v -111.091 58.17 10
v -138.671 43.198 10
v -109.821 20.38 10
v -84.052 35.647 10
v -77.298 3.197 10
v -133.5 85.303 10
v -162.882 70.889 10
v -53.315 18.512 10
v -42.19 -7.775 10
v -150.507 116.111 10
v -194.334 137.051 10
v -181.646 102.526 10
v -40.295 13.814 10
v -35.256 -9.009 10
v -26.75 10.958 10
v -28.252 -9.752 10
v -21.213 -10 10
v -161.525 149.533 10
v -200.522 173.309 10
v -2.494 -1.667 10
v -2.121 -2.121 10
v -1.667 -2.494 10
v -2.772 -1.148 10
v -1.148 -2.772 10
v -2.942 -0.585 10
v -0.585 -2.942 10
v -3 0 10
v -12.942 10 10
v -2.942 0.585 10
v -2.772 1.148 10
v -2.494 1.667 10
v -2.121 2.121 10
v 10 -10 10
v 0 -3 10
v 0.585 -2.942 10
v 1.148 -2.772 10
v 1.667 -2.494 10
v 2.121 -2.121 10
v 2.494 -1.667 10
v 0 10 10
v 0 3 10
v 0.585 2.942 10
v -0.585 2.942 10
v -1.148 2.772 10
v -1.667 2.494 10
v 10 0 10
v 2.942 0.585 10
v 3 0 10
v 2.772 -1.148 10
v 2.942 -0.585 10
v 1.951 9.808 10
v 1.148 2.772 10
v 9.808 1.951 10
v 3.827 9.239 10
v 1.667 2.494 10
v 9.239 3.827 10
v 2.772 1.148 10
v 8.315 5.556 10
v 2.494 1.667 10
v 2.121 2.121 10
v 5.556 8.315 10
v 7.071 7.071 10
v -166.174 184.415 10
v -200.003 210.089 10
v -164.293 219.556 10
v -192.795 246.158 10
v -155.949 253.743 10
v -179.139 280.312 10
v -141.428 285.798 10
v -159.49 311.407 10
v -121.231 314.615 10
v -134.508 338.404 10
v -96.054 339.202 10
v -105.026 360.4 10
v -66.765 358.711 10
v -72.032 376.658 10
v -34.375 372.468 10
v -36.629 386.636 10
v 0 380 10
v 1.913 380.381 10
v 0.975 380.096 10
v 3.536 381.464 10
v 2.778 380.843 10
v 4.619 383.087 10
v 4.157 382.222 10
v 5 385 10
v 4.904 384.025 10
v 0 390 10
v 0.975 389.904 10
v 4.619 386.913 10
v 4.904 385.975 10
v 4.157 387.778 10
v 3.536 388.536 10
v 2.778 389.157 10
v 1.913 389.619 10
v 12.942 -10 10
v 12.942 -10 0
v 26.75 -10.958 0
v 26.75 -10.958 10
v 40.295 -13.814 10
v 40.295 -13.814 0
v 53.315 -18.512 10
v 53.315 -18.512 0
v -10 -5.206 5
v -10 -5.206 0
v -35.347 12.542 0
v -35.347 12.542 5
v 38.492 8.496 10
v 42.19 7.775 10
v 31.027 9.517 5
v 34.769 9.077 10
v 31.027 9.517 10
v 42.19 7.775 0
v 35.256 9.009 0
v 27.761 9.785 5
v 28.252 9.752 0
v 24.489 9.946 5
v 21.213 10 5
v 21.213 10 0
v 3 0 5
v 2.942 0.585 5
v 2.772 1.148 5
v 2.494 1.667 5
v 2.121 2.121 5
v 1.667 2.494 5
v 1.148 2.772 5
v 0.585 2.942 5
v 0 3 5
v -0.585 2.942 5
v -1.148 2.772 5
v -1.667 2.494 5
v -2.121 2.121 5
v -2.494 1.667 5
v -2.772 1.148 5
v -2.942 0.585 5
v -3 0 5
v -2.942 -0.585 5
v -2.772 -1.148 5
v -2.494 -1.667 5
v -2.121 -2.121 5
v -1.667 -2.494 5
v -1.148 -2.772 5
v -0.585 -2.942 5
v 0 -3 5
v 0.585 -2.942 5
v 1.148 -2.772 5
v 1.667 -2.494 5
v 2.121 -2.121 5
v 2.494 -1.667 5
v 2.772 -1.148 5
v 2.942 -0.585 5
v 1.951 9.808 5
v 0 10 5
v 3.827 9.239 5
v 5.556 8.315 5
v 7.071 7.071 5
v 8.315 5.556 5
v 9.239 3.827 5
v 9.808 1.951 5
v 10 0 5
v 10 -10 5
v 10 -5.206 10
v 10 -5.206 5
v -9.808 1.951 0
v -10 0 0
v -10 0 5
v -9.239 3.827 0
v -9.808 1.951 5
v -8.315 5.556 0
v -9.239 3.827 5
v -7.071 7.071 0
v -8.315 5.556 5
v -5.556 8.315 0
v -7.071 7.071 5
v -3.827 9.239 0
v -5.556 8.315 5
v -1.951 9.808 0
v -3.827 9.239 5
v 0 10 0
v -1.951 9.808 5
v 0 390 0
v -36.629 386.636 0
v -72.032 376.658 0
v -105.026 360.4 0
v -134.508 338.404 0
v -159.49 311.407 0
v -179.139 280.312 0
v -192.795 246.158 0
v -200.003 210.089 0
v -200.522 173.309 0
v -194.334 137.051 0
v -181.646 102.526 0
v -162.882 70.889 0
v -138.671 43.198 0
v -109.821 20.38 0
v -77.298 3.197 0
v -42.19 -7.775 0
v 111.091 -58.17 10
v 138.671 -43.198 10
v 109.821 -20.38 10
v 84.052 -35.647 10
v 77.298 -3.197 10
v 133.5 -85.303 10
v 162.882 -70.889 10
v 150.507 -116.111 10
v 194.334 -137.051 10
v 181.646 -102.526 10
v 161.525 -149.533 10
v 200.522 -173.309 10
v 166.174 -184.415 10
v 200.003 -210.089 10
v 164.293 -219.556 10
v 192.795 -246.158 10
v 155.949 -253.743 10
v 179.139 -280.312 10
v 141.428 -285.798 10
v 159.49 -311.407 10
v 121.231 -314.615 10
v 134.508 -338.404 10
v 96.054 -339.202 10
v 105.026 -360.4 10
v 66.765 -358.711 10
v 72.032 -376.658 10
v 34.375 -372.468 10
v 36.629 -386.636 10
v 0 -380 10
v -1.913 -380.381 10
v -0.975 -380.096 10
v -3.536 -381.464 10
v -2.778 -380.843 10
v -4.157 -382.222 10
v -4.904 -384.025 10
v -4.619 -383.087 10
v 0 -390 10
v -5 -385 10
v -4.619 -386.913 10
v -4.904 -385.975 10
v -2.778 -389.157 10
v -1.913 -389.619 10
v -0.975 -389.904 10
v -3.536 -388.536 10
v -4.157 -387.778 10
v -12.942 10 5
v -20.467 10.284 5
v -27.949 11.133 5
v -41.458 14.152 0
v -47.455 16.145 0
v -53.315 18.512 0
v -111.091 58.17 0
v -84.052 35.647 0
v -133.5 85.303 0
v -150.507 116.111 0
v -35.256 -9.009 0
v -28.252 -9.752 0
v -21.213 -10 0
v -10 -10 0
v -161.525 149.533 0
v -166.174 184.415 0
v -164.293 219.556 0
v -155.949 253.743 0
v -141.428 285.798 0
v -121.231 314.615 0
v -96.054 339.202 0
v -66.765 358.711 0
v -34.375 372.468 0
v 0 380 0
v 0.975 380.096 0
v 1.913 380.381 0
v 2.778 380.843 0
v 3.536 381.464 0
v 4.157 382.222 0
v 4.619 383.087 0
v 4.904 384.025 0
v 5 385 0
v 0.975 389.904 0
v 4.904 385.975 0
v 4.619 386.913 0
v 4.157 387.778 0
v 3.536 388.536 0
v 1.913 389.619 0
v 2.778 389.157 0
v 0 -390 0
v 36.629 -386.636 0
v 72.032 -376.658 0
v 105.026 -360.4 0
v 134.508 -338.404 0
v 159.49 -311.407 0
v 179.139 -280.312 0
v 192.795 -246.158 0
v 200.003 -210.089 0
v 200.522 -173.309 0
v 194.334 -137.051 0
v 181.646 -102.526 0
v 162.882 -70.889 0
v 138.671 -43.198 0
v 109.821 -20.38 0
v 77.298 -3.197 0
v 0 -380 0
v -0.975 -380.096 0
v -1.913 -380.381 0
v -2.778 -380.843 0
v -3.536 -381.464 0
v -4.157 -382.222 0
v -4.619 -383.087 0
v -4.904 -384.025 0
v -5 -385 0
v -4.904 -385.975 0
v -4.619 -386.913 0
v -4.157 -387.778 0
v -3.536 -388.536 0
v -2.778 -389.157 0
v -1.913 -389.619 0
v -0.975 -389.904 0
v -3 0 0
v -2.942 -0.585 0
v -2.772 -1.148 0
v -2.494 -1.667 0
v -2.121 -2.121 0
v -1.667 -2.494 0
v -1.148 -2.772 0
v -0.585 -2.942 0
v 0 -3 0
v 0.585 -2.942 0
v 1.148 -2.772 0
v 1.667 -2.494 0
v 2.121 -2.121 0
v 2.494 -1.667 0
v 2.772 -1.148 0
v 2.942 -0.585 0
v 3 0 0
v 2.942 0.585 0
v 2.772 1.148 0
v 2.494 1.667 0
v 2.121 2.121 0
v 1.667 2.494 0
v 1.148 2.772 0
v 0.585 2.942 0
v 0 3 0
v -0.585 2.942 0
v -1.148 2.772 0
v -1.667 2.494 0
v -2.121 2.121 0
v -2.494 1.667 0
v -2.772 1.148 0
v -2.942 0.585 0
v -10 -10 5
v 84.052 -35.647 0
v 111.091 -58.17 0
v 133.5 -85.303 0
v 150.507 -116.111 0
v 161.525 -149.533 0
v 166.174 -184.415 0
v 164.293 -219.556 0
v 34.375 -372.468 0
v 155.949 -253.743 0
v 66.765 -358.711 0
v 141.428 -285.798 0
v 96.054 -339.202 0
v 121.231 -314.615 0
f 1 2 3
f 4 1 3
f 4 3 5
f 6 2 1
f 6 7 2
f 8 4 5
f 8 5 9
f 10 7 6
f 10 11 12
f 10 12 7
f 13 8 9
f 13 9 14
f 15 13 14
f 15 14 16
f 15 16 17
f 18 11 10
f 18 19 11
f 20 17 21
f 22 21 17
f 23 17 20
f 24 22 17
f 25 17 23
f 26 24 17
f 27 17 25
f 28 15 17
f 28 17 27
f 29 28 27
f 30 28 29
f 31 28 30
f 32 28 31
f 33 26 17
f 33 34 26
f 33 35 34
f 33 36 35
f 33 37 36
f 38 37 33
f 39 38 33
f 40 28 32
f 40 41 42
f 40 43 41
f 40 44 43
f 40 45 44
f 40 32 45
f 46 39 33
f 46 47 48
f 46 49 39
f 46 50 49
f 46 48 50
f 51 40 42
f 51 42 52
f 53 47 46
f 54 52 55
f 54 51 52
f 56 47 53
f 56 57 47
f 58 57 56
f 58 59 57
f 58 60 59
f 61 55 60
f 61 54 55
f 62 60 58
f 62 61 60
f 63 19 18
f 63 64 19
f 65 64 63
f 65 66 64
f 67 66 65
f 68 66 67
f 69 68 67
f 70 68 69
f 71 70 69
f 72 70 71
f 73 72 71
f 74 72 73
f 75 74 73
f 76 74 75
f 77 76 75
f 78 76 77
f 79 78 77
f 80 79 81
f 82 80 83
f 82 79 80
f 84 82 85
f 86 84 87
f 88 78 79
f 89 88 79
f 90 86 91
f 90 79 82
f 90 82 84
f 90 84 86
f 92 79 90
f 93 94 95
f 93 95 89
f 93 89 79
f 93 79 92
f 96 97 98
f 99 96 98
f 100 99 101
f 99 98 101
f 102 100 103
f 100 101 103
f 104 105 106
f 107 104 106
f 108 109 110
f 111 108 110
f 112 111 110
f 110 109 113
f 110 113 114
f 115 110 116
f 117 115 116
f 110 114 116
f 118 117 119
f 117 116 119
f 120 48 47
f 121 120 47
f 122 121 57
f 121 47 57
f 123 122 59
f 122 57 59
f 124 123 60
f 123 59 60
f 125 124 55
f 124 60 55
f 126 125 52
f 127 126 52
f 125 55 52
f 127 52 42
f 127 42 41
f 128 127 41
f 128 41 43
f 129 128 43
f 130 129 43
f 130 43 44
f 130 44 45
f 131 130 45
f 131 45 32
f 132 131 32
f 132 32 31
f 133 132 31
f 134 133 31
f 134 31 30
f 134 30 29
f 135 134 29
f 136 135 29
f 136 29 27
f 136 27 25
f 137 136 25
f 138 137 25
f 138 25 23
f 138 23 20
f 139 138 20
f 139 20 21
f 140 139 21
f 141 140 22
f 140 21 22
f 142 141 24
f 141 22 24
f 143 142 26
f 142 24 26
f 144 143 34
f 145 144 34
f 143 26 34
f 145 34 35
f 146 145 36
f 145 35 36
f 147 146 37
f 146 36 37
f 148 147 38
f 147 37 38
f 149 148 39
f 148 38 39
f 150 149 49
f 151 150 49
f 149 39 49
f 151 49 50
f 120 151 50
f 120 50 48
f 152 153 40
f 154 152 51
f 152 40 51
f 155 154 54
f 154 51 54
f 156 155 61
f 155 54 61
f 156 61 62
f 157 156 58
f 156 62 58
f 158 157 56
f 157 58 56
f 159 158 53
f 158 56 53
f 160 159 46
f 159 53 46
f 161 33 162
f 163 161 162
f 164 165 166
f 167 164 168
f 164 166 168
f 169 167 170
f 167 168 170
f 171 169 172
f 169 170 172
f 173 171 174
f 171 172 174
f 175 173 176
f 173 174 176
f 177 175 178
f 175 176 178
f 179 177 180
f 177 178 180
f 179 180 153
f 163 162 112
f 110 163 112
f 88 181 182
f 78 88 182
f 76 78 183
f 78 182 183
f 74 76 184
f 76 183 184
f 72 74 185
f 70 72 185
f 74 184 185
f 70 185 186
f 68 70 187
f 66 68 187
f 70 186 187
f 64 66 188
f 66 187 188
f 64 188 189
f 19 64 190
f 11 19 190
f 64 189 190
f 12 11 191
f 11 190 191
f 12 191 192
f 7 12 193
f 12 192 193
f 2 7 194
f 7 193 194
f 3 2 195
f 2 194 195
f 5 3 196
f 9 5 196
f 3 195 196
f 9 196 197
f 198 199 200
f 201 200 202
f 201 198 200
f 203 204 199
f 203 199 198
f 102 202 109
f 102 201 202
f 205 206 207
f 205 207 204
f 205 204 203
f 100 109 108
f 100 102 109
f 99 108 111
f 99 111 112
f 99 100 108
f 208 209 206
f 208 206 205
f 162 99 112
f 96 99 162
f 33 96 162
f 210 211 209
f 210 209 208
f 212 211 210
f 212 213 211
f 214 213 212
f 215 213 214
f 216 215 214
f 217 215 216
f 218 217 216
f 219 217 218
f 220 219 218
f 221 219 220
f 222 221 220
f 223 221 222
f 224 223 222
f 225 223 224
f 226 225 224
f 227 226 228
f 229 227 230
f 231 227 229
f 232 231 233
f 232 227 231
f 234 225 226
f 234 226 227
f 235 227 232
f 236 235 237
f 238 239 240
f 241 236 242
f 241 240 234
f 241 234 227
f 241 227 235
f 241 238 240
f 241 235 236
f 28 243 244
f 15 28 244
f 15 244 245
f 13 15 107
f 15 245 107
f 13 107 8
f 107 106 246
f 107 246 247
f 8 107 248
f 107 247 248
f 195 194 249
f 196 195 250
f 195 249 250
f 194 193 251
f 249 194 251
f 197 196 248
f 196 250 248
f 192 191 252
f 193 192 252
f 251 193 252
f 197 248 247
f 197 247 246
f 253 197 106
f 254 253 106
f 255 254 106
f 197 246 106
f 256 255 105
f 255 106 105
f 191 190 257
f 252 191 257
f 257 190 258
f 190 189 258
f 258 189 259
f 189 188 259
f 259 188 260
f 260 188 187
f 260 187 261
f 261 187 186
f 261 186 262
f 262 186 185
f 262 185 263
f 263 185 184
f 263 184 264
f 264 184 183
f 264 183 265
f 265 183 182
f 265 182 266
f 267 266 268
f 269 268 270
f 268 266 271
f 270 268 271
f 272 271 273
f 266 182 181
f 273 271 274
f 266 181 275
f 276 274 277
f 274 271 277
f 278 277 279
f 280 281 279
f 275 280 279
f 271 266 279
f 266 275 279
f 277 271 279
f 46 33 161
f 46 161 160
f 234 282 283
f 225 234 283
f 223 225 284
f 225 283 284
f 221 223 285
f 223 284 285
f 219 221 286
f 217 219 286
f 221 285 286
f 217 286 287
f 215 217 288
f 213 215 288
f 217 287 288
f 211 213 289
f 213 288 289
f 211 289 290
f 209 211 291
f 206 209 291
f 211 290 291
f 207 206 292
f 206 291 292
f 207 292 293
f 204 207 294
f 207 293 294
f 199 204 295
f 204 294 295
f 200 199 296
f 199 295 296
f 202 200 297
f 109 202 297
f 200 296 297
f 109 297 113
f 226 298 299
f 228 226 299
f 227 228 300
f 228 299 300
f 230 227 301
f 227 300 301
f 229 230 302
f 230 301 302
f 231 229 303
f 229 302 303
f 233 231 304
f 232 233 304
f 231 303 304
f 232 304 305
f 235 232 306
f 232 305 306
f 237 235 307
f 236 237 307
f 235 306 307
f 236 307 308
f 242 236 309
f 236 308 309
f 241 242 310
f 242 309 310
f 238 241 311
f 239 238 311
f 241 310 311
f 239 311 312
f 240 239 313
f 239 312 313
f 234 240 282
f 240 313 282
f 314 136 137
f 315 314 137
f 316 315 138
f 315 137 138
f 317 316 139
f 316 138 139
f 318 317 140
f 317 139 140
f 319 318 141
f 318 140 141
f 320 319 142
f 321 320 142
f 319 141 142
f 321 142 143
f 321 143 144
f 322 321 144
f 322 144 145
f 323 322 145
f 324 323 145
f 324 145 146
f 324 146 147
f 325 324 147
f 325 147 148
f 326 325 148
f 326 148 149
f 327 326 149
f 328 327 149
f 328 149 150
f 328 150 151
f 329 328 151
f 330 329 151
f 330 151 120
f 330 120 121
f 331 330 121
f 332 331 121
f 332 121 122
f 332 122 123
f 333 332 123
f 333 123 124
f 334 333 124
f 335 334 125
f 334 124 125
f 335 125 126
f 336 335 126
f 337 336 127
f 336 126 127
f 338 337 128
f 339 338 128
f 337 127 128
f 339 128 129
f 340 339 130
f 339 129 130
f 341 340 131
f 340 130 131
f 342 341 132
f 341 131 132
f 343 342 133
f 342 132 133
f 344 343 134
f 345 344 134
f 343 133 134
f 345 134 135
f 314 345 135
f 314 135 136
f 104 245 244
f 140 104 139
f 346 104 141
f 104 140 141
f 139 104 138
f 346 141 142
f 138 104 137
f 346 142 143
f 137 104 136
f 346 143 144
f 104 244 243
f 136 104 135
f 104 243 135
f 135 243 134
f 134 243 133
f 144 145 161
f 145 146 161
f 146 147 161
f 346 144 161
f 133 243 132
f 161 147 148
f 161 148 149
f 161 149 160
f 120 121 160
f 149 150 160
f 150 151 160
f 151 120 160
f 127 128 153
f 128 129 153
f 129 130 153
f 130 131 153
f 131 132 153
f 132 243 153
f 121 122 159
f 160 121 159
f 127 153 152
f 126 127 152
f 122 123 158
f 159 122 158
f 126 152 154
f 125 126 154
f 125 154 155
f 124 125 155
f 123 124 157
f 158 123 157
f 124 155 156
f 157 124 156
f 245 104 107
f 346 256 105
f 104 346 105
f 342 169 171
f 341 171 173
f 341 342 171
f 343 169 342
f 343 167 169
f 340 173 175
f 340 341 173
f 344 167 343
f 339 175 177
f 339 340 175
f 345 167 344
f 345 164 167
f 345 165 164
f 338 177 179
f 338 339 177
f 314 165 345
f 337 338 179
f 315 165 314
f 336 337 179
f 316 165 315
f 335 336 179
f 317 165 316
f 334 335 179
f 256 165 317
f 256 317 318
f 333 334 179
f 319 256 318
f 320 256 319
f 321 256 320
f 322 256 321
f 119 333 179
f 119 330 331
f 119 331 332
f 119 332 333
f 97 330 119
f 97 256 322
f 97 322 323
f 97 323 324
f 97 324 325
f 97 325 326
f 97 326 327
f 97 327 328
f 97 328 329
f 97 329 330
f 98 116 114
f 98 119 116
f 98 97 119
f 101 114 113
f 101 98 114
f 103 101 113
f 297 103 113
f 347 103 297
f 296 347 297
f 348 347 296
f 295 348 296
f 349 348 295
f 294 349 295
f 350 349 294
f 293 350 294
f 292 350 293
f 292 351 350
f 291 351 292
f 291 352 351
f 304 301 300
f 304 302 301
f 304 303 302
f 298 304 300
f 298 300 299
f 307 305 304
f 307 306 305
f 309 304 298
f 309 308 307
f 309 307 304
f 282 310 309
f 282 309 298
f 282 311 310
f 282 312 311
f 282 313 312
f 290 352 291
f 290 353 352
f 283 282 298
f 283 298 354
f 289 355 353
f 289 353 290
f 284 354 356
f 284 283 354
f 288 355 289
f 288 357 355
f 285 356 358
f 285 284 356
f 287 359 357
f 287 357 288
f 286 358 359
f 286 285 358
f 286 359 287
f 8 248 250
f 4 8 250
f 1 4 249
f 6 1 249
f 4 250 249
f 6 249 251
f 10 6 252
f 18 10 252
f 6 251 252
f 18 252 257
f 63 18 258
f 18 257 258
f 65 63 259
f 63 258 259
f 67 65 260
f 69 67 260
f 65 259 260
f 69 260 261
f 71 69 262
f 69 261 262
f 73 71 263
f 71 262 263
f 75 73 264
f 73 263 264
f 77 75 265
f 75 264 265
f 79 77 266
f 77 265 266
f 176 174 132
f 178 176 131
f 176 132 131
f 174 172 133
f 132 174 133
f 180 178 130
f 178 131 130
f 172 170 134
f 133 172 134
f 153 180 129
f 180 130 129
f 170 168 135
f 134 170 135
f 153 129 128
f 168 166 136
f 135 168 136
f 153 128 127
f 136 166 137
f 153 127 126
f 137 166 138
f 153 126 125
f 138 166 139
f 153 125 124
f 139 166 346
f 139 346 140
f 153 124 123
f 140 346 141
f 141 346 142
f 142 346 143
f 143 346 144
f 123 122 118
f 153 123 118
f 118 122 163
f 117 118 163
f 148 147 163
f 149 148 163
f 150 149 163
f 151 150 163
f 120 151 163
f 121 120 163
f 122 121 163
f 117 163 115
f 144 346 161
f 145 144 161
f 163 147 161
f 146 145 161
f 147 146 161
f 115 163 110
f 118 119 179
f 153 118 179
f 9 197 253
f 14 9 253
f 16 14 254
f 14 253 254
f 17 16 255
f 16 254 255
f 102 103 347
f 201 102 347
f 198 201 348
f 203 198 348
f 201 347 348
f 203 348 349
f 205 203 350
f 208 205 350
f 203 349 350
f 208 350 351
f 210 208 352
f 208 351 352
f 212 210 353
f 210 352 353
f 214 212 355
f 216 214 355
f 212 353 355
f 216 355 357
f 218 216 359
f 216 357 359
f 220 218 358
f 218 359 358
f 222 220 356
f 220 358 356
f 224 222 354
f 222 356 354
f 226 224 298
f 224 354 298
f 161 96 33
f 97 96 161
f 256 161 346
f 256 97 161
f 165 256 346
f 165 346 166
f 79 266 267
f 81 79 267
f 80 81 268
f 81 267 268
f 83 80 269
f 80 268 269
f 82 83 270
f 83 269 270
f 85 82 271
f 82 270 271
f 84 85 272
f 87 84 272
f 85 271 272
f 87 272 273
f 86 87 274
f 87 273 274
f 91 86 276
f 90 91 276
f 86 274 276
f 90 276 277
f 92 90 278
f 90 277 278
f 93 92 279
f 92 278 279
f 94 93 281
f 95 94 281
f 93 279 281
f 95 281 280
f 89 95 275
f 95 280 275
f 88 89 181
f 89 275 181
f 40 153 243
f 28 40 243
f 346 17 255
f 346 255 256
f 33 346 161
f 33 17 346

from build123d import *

# Parameters (mm, degrees)
F1_DEPTH  = 10
F2_R      = 3
F3_DEPTH  = 25
F6_DEPTH  = 5
F10_DEPTH = 5
F12_DEPTH = 5
F13_DEPTH = 5
F15_DEPTH = 5
F16_DEPTH = 5


with BuildPart() as f1:
    # F0 (on Top) → F1 (new body)
    with BuildSketch(Plane.XY):
        with BuildLine():
            ThreePointArc((0, 380), (5, 385), (0, 390))
            ThreePointArc((0, 390), (-200.0031288383, 210.088535299), (-42.1904132607, -7.7750309023))
            ThreePointArc((-42.1904132607, -7.7750309023), (-31.7606417446, -9.4422020327), (-21.2132034356, -10))
            Line((-21.2132034356, -10), (0, -10))
            Line((0, -10), (12.9417308956, -10))
            ThreePointArc((12.9417308956, -10), (33.5719267784, -12.1511624094), (53.3145446236, -18.5120996432))
            ThreePointArc((53.3145446236, -18.5120996432), (164.29346462, -219.555514643), (0, -380))
            ThreePointArc((0, -380), (-5, -385), (0, -390))
            ThreePointArc((0, -390), (200.0031288383, -210.088535299), (42.1904132607, 7.7750309023))
            ThreePointArc((42.1904132607, 7.7750309023), (31.7606417446, 9.4422020327), (21.2132034356, 10))
            Line((21.2132034356, 10), (0, 10))
            Line((0, 10), (-12.9417308956, 10))
            ThreePointArc((-12.9417308956, 10), (-33.5719267784, 12.1511624094), (-53.3145446236, 18.5120996432))
            ThreePointArc((-53.3145446236, 18.5120996432), (-164.29346462, 219.555514643), (0, 380))
        make_face()
    extrude(amount=F1_DEPTH)

    # F2 (on face) → F3 (cut)
    with BuildSketch(Plane.XY.offset(10)):
        Circle(F2_R)
        with BuildLine():
            ThreePointArc((0, 10), (10, 0), (0, -10))
            Line((0, -10), (12.9417308956, -10))
            ThreePointArc((12.9417308956, -10), (33.5719267784, -12.1511624094), (53.3145446236, -18.5120996432))
            ThreePointArc((53.3145446236, -18.5120996432), (164.29346462, -219.555514643), (0, -380))
            ThreePointArc((0, -380), (-5, -385), (0, -390))
            ThreePointArc((0, -390), (200.0031288383, -210.088535299), (42.1904132607, 7.7750309023))
            ThreePointArc((42.1904132607, 7.7750309023), (31.7606417446, 9.4422020327), (21.2132034356, 10))
            Line((21.2132034356, 10), (0, 10))
        make_face()
    extrude(amount=-F3_DEPTH, mode=Mode.SUBTRACT)


with BuildPart() as f4_1:
    # F4: instance of F1
    add(f1.part.mirror(Plane.YZ))


with BuildPart() as f1_1:
    add(f1.part)

    # F5 (on face) → F6 (cut)
    with BuildSketch(Plane(origin=(0, 0, 0), x_dir=(1, 0, 0), z_dir=(0, 0, -1))):
        with BuildLine():
            ThreePointArc((0, -10), (7.0710678119, -7.0710678119), (10, 0))
            ThreePointArc((10, 0), (4.6174861324, 8.8701083318), (-5.7357643635, 8.1915204429))
            ThreePointArc((-5.7357643635, 8.1915204429), (-9.5371695075, -3.007057995), (0, -10))
        make_face()
        with BuildLine():
            ThreePointArc((0, -10), (-9.5371695075, -3.007057995), (-5.7357643635, 8.1915204429))
            Line((-5.7357643635, 8.1915204429), (-35.3465892462, -12.5422023525))
            ThreePointArc((-35.3465892462, -12.5422023525), (-24.2160431863, -10.6375831495), (-12.9417308956, -10))
            Line((-12.9417308956, -10), (0, -10))
        make_face()
    extrude(amount=-F6_DEPTH, mode=Mode.SUBTRACT)

    # F11 (on face) → F13 (cut)
    with BuildSketch(Plane(origin=(0, 0, 0), x_dir=(1, 0, 0), z_dir=(0, 0, -1))):
        with BuildLine():
            ThreePointArc((-10, 0), (-7.0710678119, 7.0710678119), (0, 10))
            Line((0, 10), (-10, 10))
            Line((-10, 10), (-10, 0))
        make_face()
    extrude(amount=-F13_DEPTH, mode=Mode.SUBTRACT)

    # F14 (on face) → F15 (join)
    with BuildSketch(Plane.XY.offset(10)):
        with BuildLine():
            ThreePointArc((10, 0), (7.0710678119, -7.0710678119), (0, -10))
            Line((0, -10), (10, -10))
            Line((10, -10), (10, 0))
        make_face()
    extrude(amount=-F15_DEPTH)


with BuildPart() as f7_1:
    # F7: instance of F4_1
    add(f4_1.part.mirror(Plane.XZ))

    # F9 (on face) → F10 (cut)
    with BuildSketch(Plane.XY.offset(10)):
        with BuildLine():
            ThreePointArc((5.7357643635, -8.1915204429), (8.8701083318, -4.6174861324), (10, 0))
            ThreePointArc((10, 0), (7.0710678119, 7.0710678119), (0, 10))
            ThreePointArc((0, 10), (-9.5371695075, -3.007057995), (5.7357643635, -8.1915204429))
        make_face()
        with BuildLine():
            ThreePointArc((0, 10), (7.0710678119, 7.0710678119), (10, 0))
            ThreePointArc((10, 0), (8.8701083318, -4.6174861324), (5.7357643635, -8.1915204429))
            Line((5.7357643635, -8.1915204429), (31.0266100505, 9.5173203549))
            ThreePointArc((31.0266100505, 9.5173203549), (26.1258383963, 9.8792571946), (21.2132034356, 10))
            Line((21.2132034356, 10), (0, 10))
        make_face()
    extrude(amount=-F10_DEPTH, mode=Mode.SUBTRACT)

    # F11 (on face) → F12 (join)
    with BuildSketch(Plane(origin=(0, 0, 0), x_dir=(1, 0, 0), z_dir=(0, 0, -1))):
        with BuildLine():
            ThreePointArc((-10, 0), (-7.0710678119, 7.0710678119), (0, 10))
            Line((0, 10), (-10, 10))
            Line((-10, 10), (-10, 0))
        make_face()
    extrude(amount=-F12_DEPTH)

    # F14 (on face) → F16 (cut)
    with BuildSketch(Plane.XY.offset(10)):
        with BuildLine():
            ThreePointArc((10, 0), (7.0710678119, -7.0710678119), (0, -10))
            Line((0, -10), (10, -10))
            Line((10, -10), (10, 0))
        make_face()
    extrude(amount=-F16_DEPTH, mode=Mode.SUBTRACT)


solid = Compound([f1_1.part, f7_1.part])
